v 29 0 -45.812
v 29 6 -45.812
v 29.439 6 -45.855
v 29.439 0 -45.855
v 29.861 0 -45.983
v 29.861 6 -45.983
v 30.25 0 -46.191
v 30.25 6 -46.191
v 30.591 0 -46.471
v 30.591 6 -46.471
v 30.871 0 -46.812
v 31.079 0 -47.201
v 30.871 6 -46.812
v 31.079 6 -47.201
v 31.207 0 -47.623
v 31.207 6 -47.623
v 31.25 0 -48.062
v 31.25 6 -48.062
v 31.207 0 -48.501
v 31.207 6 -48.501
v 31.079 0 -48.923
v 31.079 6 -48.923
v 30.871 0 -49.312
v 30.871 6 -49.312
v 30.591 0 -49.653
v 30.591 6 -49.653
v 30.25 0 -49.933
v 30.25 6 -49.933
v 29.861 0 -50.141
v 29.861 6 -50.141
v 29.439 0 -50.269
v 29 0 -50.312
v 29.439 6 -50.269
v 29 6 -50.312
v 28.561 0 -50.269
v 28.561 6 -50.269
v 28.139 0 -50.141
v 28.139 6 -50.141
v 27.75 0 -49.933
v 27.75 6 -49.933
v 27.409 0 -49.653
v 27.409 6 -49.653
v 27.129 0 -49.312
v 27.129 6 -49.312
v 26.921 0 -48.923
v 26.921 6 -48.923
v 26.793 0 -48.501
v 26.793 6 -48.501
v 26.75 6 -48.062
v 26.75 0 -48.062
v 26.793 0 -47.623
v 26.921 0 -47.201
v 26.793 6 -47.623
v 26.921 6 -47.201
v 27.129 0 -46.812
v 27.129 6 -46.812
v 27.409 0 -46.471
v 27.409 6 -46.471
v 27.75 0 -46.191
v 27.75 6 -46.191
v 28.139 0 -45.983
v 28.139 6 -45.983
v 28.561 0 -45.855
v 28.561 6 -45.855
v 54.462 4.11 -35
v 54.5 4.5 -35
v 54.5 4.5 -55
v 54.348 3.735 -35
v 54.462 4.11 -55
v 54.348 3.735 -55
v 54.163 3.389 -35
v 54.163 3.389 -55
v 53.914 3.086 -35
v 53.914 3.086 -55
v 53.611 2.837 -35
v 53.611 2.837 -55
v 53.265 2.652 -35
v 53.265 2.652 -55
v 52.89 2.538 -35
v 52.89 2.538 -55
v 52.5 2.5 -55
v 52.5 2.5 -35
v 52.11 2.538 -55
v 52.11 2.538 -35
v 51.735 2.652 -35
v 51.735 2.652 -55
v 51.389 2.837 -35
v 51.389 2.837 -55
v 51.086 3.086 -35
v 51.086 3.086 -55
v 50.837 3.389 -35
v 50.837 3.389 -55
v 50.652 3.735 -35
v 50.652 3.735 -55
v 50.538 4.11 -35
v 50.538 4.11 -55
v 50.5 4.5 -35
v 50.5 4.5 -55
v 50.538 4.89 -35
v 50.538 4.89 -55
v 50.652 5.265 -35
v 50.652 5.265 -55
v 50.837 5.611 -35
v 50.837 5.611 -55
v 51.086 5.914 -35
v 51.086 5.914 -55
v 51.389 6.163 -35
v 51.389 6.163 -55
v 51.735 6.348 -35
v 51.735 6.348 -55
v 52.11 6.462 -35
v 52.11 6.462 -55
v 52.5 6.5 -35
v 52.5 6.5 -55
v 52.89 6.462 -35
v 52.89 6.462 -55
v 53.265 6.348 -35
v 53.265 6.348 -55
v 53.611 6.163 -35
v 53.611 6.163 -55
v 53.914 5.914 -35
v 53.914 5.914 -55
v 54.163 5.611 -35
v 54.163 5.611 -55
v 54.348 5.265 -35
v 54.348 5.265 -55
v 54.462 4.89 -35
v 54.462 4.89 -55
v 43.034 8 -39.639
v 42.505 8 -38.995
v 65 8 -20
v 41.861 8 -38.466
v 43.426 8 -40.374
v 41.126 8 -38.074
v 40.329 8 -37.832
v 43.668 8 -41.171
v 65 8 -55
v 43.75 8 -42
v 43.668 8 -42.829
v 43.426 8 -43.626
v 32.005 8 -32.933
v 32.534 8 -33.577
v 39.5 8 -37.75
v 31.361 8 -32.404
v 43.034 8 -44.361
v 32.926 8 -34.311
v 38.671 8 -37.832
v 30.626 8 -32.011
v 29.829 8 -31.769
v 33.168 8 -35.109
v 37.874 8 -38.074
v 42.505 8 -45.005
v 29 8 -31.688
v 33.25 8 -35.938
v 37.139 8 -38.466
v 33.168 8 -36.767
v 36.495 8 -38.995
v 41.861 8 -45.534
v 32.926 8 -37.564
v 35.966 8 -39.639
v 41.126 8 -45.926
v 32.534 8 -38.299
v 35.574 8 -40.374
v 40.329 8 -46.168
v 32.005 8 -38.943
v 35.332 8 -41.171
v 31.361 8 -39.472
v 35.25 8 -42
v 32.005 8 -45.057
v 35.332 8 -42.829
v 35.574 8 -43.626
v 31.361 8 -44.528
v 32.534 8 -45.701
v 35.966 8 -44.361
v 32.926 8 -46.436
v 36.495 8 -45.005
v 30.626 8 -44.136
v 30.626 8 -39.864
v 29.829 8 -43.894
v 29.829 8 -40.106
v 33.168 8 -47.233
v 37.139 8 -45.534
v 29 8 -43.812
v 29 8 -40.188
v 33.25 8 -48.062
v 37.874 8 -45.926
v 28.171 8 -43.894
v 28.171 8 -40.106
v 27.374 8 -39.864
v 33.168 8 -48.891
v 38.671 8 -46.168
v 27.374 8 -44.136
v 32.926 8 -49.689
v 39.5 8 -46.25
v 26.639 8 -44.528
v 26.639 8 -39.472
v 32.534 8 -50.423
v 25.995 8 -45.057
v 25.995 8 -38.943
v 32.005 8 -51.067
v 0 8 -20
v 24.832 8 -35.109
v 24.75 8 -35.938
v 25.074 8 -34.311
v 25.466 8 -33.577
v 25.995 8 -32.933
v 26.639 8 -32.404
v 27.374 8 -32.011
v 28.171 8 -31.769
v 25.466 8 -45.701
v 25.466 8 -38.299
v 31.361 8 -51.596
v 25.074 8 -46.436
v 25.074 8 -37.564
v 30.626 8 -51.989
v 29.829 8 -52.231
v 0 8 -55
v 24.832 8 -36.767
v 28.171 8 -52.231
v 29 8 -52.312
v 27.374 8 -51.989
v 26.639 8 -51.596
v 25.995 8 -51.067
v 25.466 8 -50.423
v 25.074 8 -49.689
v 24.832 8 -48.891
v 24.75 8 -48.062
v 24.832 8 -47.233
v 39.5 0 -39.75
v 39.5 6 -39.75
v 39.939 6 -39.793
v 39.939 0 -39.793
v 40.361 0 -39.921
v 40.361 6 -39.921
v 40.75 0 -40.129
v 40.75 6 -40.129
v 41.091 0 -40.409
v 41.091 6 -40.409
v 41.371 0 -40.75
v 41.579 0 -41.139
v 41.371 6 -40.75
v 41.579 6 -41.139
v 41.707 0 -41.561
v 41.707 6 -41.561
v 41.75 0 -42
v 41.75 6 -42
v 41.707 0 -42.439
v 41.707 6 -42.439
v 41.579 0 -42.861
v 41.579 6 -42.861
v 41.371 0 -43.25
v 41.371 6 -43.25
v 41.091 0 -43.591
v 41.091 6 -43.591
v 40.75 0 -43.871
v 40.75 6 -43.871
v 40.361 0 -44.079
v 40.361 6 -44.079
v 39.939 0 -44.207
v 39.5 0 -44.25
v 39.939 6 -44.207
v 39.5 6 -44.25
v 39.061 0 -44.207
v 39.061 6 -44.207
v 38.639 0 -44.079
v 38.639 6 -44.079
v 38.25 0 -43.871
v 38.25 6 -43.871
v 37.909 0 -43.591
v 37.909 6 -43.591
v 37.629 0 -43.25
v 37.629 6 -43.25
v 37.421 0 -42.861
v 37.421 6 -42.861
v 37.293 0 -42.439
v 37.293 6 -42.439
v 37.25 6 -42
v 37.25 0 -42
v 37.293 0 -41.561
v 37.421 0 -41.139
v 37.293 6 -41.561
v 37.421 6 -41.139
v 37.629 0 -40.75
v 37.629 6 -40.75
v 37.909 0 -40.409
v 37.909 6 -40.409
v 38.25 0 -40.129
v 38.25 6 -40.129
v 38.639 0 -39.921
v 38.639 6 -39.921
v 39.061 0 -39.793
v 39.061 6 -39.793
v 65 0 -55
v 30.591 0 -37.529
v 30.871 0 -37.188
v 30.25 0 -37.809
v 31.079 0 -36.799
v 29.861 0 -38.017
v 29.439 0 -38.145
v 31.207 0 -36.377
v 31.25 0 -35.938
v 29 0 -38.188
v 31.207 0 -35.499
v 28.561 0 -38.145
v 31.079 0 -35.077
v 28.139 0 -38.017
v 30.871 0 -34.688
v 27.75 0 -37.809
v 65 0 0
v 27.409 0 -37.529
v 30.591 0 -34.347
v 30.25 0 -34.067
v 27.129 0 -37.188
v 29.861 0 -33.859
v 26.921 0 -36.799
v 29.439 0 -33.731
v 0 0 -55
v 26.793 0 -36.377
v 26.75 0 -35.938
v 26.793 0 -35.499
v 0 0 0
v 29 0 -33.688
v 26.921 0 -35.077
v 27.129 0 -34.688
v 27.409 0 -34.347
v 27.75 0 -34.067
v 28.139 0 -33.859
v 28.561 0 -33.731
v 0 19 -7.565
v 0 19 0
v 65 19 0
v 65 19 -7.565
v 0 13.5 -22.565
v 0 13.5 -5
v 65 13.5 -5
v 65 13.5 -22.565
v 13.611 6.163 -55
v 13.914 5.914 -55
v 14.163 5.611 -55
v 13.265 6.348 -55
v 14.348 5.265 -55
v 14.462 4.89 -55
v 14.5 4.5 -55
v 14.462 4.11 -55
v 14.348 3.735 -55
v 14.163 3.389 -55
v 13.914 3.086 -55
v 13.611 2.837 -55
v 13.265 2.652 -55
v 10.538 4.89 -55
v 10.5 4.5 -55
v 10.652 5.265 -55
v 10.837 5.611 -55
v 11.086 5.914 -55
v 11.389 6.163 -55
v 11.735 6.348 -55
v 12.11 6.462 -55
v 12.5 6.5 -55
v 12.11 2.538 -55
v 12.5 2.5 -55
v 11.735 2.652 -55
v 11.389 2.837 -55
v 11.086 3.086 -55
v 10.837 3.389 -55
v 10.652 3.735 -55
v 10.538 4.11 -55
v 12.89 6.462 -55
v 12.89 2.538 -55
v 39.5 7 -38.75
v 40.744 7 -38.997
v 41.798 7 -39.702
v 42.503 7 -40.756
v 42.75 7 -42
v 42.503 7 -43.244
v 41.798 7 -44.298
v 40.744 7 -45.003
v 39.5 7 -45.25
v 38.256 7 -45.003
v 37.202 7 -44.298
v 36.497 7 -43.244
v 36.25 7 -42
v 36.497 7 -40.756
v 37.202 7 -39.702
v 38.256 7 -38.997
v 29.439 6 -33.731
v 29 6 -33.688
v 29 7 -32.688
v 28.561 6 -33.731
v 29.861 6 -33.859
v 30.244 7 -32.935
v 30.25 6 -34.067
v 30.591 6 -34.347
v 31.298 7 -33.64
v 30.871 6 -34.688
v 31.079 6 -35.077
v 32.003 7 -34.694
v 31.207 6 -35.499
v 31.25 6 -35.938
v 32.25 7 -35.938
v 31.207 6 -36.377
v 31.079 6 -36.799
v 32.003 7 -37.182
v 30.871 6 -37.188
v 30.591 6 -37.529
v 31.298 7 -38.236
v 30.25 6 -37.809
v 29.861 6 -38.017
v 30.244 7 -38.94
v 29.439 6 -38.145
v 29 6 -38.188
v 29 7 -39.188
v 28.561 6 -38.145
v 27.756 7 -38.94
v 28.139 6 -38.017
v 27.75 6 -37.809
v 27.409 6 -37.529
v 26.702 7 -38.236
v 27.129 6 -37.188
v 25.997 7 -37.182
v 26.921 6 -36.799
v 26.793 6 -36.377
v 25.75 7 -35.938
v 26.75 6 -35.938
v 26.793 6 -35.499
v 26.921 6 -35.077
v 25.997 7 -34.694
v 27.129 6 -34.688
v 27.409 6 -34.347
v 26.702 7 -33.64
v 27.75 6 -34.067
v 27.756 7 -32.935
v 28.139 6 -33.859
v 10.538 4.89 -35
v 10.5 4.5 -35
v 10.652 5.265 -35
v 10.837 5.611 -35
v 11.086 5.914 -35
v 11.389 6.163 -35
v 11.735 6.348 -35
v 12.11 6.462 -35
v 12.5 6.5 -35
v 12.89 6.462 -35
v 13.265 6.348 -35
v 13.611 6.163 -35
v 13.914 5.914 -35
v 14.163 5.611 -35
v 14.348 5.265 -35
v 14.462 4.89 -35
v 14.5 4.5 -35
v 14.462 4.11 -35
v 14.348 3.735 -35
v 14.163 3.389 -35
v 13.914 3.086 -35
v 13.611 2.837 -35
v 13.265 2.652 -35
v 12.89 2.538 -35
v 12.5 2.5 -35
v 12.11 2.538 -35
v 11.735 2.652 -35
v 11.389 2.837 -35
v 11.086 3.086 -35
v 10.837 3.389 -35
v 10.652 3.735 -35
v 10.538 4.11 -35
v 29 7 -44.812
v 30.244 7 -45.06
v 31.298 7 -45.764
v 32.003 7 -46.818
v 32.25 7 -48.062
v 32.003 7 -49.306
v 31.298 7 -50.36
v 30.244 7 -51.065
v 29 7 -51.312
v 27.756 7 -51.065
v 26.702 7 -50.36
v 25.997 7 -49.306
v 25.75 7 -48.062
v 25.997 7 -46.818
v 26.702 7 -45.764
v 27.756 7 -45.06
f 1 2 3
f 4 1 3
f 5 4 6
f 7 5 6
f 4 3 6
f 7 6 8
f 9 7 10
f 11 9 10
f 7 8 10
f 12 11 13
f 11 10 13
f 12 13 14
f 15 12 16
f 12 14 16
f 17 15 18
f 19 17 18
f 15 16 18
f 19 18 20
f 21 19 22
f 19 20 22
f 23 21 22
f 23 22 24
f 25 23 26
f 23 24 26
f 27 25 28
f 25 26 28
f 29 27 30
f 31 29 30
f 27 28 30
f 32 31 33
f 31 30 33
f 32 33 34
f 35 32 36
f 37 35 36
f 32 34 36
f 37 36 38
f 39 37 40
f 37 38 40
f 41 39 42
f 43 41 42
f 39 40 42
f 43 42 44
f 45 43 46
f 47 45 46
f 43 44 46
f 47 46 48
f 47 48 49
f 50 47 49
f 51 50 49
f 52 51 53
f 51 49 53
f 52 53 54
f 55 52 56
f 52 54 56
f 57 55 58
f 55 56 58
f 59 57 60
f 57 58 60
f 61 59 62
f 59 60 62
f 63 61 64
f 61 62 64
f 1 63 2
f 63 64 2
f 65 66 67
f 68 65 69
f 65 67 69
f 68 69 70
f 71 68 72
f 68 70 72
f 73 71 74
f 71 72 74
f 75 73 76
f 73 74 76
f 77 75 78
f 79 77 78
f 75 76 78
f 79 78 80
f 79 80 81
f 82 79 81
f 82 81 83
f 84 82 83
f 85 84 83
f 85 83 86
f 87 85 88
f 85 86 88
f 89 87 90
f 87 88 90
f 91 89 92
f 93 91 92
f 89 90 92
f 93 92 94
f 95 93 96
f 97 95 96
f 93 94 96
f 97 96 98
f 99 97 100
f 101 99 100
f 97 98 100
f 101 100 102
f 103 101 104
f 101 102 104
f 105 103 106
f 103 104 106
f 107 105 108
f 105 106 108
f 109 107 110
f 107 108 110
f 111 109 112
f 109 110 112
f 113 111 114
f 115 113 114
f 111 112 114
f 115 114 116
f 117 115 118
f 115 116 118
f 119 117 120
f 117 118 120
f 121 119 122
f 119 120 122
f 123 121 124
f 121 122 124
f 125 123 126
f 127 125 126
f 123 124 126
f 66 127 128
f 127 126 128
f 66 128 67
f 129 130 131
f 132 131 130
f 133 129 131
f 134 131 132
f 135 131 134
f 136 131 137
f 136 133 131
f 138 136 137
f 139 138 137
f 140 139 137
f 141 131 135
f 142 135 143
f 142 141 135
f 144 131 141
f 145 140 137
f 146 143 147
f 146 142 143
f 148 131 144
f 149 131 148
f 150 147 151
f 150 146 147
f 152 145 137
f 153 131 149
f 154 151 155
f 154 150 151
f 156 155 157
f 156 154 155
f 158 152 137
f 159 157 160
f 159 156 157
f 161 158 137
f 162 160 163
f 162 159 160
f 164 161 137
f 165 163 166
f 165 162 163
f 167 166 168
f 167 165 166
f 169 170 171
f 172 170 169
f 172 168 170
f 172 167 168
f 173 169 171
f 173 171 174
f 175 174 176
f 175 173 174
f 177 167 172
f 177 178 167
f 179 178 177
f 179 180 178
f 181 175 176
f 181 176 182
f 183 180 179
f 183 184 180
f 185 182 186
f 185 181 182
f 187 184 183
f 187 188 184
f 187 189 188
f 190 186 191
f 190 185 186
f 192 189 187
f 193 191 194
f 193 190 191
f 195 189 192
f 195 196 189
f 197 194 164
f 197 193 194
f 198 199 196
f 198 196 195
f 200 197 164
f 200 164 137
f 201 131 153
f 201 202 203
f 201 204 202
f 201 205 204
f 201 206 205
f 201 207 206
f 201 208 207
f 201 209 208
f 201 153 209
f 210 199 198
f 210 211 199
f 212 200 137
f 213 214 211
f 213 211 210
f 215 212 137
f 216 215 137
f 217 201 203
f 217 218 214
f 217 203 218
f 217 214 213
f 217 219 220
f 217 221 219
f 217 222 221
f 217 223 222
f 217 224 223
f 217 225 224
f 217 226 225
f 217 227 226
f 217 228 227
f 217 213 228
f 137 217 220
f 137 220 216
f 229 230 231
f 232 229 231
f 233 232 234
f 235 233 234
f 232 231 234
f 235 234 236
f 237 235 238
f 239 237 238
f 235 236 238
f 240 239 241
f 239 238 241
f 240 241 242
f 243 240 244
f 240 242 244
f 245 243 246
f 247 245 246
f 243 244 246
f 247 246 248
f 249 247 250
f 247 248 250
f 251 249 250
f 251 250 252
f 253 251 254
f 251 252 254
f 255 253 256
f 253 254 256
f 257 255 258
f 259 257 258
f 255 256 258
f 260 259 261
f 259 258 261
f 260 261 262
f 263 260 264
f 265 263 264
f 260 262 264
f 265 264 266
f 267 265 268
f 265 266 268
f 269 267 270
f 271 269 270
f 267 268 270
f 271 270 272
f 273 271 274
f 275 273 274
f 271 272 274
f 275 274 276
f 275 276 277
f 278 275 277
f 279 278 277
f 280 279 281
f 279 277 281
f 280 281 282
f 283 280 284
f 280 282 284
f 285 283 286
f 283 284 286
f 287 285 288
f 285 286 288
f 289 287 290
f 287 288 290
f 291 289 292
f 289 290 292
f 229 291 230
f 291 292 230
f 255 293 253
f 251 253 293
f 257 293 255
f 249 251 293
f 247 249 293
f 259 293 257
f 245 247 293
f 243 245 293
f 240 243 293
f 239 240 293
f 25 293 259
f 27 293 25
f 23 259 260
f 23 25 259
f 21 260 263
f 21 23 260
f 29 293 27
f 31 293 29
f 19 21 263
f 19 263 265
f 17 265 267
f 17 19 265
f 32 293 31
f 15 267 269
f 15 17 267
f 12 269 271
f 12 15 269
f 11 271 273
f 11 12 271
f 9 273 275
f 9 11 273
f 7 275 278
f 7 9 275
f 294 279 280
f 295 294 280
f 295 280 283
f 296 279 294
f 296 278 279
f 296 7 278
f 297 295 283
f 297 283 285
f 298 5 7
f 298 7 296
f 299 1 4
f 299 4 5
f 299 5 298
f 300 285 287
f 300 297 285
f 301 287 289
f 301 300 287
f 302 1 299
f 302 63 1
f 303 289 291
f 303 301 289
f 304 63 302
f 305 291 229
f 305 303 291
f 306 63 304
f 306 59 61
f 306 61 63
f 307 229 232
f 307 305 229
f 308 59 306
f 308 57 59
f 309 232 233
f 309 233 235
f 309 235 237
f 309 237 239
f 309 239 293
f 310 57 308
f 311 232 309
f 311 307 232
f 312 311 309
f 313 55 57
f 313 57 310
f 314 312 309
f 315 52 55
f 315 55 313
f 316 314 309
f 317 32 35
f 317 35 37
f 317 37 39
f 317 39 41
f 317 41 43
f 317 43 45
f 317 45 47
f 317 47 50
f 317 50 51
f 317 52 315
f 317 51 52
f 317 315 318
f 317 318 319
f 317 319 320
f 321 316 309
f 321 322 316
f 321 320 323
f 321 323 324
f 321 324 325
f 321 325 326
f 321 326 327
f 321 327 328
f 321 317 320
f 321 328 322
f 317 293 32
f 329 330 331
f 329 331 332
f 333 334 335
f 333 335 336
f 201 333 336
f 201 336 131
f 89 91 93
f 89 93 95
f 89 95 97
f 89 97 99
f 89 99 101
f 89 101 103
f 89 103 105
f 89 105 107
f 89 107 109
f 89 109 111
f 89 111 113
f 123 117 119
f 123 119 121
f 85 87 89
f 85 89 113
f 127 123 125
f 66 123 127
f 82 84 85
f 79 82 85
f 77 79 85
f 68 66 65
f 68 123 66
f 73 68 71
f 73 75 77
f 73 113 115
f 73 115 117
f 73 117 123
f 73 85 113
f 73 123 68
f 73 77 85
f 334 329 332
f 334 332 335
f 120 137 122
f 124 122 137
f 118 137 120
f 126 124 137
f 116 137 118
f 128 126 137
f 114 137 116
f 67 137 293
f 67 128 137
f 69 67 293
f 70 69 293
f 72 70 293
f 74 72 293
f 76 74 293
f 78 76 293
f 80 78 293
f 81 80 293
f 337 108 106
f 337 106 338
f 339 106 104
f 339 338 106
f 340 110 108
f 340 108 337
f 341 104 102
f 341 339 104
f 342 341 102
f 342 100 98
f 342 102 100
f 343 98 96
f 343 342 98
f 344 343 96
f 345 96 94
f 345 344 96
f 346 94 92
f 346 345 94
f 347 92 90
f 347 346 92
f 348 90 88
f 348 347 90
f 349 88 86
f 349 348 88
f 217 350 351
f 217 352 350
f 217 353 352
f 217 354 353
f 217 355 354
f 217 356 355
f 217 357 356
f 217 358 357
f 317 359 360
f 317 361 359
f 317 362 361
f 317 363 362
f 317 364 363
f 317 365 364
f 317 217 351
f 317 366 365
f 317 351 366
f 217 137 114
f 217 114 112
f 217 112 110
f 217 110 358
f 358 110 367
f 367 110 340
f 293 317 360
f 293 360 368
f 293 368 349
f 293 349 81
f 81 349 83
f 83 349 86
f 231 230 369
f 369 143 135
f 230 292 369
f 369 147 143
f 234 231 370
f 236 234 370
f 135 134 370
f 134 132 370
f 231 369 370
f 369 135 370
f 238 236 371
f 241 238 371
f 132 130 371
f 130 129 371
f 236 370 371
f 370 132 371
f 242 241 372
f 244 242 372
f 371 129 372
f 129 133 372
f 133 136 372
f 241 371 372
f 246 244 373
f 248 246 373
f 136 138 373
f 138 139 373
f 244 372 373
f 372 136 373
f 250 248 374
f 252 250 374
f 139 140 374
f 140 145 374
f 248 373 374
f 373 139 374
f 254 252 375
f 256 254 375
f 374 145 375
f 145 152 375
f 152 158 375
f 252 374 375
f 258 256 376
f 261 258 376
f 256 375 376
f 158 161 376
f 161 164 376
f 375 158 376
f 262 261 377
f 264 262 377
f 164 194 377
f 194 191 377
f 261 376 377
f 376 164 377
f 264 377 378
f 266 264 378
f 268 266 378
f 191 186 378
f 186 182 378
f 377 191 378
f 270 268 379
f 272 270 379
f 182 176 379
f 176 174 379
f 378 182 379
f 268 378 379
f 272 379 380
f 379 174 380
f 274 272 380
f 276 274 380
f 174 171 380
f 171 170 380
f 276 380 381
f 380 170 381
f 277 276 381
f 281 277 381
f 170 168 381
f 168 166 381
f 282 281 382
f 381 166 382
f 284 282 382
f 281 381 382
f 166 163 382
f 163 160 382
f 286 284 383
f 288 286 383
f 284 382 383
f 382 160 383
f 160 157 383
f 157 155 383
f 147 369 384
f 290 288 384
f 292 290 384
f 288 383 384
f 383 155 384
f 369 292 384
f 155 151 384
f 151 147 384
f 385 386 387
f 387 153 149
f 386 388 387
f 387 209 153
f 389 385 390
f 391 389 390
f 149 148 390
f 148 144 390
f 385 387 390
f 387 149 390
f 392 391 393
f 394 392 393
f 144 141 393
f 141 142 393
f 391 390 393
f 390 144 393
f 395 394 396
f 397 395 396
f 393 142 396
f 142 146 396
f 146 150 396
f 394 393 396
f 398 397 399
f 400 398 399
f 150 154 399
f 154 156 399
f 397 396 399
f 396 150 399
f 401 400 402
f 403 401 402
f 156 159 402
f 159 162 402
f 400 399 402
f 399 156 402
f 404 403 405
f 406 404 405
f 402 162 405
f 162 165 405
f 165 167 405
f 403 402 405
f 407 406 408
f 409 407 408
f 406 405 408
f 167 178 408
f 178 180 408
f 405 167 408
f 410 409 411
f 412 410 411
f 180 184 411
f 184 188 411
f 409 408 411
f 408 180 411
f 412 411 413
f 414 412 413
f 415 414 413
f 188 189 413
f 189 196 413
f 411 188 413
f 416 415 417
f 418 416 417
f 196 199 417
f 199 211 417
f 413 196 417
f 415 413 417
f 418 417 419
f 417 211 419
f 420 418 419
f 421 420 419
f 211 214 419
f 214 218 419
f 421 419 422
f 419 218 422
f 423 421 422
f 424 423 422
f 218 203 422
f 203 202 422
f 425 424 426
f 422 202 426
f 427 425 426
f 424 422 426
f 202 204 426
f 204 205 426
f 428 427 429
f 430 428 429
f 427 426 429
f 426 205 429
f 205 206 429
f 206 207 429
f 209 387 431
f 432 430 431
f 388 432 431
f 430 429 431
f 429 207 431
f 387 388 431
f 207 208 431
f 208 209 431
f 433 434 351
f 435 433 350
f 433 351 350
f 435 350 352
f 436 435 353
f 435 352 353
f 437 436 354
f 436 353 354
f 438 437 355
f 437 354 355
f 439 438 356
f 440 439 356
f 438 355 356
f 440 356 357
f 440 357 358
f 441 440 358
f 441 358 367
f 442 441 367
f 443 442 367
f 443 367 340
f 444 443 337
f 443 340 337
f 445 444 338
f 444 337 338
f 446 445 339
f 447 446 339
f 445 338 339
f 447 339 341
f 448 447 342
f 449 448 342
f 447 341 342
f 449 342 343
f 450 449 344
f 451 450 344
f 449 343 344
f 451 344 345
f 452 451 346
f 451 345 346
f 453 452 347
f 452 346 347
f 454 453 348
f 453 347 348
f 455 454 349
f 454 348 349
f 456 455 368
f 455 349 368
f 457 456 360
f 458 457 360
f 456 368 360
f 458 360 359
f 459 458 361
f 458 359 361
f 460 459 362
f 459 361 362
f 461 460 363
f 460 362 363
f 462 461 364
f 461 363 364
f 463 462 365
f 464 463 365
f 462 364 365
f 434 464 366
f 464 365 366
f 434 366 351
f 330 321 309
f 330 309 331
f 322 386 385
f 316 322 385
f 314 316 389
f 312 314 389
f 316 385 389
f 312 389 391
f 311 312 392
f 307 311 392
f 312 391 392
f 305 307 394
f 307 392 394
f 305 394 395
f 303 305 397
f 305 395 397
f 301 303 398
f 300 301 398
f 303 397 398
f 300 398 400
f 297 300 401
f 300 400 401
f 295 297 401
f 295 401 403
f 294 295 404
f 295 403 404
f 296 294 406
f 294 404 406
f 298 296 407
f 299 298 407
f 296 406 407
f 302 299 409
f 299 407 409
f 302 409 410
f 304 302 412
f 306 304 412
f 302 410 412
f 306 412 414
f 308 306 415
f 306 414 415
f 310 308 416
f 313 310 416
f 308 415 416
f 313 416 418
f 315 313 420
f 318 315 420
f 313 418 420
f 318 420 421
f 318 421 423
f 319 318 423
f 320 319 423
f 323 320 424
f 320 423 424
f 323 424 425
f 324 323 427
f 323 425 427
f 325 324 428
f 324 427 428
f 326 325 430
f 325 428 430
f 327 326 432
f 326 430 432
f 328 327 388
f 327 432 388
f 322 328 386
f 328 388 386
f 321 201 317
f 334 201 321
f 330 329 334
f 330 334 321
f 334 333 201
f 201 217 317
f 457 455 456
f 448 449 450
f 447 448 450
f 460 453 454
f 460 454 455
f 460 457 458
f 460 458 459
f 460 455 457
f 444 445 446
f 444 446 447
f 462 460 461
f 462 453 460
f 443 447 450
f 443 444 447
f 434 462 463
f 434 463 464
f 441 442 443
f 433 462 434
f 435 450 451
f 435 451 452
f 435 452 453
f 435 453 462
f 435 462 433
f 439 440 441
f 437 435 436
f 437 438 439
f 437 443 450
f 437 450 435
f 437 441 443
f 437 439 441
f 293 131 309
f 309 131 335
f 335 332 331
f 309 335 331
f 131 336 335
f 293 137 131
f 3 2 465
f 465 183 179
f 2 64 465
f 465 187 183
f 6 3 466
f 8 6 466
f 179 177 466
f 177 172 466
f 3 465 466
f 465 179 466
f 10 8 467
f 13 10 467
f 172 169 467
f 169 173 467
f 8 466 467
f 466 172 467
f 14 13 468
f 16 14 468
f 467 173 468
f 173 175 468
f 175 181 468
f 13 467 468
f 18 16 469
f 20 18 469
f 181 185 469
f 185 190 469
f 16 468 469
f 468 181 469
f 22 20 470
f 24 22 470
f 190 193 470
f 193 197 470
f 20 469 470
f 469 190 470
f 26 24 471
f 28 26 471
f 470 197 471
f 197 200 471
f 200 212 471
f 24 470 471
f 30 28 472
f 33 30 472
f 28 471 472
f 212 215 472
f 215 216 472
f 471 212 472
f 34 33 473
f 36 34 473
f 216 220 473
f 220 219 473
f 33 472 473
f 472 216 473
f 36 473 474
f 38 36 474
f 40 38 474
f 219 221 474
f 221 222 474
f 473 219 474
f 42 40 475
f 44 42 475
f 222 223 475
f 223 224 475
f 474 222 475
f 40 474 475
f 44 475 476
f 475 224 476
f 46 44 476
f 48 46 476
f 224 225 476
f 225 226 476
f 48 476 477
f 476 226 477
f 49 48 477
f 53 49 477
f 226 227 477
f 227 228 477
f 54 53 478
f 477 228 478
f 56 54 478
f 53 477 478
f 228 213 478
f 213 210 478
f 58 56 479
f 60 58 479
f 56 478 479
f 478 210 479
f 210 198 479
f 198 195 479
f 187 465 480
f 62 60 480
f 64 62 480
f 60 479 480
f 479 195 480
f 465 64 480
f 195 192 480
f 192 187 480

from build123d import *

# Parameters (mm, degrees)
BOSS_EXTRUDE1_DEPTH = 65
SKETCH2_R           = 2
M_DRILL_DEPTH       = 20
SKETCH3_R           = 2.25
M4_THROUGH_DEPTH    = 8
CHAMFER1_SIZE       = 2


with BuildPart() as part:
    # Sketch1 → Boss-Extrude1 (new body)
    with BuildSketch(Plane(origin=(0, 0, 0), x_dir=(0, 0, -1), z_dir=(1, 0, 0))):
        Polygon((0, 0), (0, 19), (7.56469212, 19), (5, 13.5), (22.56469212, 13.5), (20, 8), (55, 8), (55, 0), align=None)
    extrude(amount=BOSS_EXTRUDE1_DEPTH)

    # Sketch2 → M$_DRILL (cut)
    with BuildSketch(Plane(origin=(0, 0, -55), x_dir=(-1, 0, 0), z_dir=(0, 0, -1))):
        with Locations((-12.5, 4.5)):
            Circle(SKETCH2_R)
        with Locations(Location((-52.5, 4.5, 0), (0, 0, 180))):
            Circle(SKETCH2_R)
    extrude(amount=-M_DRILL_DEPTH, mode=Mode.SUBTRACT)

    # Sketch3 → M4_through (cut)
    with BuildSketch(Plane(origin=(0, 8, 0), x_dir=(1, 0, 0), z_dir=(0, 1, 0))):
        with Locations(Location((39.5, 42, 0), (0, 0, 270))):
            Circle(SKETCH3_R)
        with Locations(Location((29, 35.937822174, 0), (0, 0, 270))):
            Circle(SKETCH3_R)
        with Locations(Location((29, 48.062177826, 0), (0, 0, 270))):
            Circle(SKETCH3_R)
    extrude(amount=-M4_THROUGH_DEPTH, mode=Mode.SUBTRACT)

    # Chamfer1
    chamfer1_edges = [part.edges().sort_by_distance(p)[0] for p in [
        (39.5, 8, -44.25),
        (29, 8, -38.187822174),
        (29, 8, -50.312177826),
    ]]
    chamfer(chamfer1_edges, length=CHAMFER1_SIZE)


solid = part.part
